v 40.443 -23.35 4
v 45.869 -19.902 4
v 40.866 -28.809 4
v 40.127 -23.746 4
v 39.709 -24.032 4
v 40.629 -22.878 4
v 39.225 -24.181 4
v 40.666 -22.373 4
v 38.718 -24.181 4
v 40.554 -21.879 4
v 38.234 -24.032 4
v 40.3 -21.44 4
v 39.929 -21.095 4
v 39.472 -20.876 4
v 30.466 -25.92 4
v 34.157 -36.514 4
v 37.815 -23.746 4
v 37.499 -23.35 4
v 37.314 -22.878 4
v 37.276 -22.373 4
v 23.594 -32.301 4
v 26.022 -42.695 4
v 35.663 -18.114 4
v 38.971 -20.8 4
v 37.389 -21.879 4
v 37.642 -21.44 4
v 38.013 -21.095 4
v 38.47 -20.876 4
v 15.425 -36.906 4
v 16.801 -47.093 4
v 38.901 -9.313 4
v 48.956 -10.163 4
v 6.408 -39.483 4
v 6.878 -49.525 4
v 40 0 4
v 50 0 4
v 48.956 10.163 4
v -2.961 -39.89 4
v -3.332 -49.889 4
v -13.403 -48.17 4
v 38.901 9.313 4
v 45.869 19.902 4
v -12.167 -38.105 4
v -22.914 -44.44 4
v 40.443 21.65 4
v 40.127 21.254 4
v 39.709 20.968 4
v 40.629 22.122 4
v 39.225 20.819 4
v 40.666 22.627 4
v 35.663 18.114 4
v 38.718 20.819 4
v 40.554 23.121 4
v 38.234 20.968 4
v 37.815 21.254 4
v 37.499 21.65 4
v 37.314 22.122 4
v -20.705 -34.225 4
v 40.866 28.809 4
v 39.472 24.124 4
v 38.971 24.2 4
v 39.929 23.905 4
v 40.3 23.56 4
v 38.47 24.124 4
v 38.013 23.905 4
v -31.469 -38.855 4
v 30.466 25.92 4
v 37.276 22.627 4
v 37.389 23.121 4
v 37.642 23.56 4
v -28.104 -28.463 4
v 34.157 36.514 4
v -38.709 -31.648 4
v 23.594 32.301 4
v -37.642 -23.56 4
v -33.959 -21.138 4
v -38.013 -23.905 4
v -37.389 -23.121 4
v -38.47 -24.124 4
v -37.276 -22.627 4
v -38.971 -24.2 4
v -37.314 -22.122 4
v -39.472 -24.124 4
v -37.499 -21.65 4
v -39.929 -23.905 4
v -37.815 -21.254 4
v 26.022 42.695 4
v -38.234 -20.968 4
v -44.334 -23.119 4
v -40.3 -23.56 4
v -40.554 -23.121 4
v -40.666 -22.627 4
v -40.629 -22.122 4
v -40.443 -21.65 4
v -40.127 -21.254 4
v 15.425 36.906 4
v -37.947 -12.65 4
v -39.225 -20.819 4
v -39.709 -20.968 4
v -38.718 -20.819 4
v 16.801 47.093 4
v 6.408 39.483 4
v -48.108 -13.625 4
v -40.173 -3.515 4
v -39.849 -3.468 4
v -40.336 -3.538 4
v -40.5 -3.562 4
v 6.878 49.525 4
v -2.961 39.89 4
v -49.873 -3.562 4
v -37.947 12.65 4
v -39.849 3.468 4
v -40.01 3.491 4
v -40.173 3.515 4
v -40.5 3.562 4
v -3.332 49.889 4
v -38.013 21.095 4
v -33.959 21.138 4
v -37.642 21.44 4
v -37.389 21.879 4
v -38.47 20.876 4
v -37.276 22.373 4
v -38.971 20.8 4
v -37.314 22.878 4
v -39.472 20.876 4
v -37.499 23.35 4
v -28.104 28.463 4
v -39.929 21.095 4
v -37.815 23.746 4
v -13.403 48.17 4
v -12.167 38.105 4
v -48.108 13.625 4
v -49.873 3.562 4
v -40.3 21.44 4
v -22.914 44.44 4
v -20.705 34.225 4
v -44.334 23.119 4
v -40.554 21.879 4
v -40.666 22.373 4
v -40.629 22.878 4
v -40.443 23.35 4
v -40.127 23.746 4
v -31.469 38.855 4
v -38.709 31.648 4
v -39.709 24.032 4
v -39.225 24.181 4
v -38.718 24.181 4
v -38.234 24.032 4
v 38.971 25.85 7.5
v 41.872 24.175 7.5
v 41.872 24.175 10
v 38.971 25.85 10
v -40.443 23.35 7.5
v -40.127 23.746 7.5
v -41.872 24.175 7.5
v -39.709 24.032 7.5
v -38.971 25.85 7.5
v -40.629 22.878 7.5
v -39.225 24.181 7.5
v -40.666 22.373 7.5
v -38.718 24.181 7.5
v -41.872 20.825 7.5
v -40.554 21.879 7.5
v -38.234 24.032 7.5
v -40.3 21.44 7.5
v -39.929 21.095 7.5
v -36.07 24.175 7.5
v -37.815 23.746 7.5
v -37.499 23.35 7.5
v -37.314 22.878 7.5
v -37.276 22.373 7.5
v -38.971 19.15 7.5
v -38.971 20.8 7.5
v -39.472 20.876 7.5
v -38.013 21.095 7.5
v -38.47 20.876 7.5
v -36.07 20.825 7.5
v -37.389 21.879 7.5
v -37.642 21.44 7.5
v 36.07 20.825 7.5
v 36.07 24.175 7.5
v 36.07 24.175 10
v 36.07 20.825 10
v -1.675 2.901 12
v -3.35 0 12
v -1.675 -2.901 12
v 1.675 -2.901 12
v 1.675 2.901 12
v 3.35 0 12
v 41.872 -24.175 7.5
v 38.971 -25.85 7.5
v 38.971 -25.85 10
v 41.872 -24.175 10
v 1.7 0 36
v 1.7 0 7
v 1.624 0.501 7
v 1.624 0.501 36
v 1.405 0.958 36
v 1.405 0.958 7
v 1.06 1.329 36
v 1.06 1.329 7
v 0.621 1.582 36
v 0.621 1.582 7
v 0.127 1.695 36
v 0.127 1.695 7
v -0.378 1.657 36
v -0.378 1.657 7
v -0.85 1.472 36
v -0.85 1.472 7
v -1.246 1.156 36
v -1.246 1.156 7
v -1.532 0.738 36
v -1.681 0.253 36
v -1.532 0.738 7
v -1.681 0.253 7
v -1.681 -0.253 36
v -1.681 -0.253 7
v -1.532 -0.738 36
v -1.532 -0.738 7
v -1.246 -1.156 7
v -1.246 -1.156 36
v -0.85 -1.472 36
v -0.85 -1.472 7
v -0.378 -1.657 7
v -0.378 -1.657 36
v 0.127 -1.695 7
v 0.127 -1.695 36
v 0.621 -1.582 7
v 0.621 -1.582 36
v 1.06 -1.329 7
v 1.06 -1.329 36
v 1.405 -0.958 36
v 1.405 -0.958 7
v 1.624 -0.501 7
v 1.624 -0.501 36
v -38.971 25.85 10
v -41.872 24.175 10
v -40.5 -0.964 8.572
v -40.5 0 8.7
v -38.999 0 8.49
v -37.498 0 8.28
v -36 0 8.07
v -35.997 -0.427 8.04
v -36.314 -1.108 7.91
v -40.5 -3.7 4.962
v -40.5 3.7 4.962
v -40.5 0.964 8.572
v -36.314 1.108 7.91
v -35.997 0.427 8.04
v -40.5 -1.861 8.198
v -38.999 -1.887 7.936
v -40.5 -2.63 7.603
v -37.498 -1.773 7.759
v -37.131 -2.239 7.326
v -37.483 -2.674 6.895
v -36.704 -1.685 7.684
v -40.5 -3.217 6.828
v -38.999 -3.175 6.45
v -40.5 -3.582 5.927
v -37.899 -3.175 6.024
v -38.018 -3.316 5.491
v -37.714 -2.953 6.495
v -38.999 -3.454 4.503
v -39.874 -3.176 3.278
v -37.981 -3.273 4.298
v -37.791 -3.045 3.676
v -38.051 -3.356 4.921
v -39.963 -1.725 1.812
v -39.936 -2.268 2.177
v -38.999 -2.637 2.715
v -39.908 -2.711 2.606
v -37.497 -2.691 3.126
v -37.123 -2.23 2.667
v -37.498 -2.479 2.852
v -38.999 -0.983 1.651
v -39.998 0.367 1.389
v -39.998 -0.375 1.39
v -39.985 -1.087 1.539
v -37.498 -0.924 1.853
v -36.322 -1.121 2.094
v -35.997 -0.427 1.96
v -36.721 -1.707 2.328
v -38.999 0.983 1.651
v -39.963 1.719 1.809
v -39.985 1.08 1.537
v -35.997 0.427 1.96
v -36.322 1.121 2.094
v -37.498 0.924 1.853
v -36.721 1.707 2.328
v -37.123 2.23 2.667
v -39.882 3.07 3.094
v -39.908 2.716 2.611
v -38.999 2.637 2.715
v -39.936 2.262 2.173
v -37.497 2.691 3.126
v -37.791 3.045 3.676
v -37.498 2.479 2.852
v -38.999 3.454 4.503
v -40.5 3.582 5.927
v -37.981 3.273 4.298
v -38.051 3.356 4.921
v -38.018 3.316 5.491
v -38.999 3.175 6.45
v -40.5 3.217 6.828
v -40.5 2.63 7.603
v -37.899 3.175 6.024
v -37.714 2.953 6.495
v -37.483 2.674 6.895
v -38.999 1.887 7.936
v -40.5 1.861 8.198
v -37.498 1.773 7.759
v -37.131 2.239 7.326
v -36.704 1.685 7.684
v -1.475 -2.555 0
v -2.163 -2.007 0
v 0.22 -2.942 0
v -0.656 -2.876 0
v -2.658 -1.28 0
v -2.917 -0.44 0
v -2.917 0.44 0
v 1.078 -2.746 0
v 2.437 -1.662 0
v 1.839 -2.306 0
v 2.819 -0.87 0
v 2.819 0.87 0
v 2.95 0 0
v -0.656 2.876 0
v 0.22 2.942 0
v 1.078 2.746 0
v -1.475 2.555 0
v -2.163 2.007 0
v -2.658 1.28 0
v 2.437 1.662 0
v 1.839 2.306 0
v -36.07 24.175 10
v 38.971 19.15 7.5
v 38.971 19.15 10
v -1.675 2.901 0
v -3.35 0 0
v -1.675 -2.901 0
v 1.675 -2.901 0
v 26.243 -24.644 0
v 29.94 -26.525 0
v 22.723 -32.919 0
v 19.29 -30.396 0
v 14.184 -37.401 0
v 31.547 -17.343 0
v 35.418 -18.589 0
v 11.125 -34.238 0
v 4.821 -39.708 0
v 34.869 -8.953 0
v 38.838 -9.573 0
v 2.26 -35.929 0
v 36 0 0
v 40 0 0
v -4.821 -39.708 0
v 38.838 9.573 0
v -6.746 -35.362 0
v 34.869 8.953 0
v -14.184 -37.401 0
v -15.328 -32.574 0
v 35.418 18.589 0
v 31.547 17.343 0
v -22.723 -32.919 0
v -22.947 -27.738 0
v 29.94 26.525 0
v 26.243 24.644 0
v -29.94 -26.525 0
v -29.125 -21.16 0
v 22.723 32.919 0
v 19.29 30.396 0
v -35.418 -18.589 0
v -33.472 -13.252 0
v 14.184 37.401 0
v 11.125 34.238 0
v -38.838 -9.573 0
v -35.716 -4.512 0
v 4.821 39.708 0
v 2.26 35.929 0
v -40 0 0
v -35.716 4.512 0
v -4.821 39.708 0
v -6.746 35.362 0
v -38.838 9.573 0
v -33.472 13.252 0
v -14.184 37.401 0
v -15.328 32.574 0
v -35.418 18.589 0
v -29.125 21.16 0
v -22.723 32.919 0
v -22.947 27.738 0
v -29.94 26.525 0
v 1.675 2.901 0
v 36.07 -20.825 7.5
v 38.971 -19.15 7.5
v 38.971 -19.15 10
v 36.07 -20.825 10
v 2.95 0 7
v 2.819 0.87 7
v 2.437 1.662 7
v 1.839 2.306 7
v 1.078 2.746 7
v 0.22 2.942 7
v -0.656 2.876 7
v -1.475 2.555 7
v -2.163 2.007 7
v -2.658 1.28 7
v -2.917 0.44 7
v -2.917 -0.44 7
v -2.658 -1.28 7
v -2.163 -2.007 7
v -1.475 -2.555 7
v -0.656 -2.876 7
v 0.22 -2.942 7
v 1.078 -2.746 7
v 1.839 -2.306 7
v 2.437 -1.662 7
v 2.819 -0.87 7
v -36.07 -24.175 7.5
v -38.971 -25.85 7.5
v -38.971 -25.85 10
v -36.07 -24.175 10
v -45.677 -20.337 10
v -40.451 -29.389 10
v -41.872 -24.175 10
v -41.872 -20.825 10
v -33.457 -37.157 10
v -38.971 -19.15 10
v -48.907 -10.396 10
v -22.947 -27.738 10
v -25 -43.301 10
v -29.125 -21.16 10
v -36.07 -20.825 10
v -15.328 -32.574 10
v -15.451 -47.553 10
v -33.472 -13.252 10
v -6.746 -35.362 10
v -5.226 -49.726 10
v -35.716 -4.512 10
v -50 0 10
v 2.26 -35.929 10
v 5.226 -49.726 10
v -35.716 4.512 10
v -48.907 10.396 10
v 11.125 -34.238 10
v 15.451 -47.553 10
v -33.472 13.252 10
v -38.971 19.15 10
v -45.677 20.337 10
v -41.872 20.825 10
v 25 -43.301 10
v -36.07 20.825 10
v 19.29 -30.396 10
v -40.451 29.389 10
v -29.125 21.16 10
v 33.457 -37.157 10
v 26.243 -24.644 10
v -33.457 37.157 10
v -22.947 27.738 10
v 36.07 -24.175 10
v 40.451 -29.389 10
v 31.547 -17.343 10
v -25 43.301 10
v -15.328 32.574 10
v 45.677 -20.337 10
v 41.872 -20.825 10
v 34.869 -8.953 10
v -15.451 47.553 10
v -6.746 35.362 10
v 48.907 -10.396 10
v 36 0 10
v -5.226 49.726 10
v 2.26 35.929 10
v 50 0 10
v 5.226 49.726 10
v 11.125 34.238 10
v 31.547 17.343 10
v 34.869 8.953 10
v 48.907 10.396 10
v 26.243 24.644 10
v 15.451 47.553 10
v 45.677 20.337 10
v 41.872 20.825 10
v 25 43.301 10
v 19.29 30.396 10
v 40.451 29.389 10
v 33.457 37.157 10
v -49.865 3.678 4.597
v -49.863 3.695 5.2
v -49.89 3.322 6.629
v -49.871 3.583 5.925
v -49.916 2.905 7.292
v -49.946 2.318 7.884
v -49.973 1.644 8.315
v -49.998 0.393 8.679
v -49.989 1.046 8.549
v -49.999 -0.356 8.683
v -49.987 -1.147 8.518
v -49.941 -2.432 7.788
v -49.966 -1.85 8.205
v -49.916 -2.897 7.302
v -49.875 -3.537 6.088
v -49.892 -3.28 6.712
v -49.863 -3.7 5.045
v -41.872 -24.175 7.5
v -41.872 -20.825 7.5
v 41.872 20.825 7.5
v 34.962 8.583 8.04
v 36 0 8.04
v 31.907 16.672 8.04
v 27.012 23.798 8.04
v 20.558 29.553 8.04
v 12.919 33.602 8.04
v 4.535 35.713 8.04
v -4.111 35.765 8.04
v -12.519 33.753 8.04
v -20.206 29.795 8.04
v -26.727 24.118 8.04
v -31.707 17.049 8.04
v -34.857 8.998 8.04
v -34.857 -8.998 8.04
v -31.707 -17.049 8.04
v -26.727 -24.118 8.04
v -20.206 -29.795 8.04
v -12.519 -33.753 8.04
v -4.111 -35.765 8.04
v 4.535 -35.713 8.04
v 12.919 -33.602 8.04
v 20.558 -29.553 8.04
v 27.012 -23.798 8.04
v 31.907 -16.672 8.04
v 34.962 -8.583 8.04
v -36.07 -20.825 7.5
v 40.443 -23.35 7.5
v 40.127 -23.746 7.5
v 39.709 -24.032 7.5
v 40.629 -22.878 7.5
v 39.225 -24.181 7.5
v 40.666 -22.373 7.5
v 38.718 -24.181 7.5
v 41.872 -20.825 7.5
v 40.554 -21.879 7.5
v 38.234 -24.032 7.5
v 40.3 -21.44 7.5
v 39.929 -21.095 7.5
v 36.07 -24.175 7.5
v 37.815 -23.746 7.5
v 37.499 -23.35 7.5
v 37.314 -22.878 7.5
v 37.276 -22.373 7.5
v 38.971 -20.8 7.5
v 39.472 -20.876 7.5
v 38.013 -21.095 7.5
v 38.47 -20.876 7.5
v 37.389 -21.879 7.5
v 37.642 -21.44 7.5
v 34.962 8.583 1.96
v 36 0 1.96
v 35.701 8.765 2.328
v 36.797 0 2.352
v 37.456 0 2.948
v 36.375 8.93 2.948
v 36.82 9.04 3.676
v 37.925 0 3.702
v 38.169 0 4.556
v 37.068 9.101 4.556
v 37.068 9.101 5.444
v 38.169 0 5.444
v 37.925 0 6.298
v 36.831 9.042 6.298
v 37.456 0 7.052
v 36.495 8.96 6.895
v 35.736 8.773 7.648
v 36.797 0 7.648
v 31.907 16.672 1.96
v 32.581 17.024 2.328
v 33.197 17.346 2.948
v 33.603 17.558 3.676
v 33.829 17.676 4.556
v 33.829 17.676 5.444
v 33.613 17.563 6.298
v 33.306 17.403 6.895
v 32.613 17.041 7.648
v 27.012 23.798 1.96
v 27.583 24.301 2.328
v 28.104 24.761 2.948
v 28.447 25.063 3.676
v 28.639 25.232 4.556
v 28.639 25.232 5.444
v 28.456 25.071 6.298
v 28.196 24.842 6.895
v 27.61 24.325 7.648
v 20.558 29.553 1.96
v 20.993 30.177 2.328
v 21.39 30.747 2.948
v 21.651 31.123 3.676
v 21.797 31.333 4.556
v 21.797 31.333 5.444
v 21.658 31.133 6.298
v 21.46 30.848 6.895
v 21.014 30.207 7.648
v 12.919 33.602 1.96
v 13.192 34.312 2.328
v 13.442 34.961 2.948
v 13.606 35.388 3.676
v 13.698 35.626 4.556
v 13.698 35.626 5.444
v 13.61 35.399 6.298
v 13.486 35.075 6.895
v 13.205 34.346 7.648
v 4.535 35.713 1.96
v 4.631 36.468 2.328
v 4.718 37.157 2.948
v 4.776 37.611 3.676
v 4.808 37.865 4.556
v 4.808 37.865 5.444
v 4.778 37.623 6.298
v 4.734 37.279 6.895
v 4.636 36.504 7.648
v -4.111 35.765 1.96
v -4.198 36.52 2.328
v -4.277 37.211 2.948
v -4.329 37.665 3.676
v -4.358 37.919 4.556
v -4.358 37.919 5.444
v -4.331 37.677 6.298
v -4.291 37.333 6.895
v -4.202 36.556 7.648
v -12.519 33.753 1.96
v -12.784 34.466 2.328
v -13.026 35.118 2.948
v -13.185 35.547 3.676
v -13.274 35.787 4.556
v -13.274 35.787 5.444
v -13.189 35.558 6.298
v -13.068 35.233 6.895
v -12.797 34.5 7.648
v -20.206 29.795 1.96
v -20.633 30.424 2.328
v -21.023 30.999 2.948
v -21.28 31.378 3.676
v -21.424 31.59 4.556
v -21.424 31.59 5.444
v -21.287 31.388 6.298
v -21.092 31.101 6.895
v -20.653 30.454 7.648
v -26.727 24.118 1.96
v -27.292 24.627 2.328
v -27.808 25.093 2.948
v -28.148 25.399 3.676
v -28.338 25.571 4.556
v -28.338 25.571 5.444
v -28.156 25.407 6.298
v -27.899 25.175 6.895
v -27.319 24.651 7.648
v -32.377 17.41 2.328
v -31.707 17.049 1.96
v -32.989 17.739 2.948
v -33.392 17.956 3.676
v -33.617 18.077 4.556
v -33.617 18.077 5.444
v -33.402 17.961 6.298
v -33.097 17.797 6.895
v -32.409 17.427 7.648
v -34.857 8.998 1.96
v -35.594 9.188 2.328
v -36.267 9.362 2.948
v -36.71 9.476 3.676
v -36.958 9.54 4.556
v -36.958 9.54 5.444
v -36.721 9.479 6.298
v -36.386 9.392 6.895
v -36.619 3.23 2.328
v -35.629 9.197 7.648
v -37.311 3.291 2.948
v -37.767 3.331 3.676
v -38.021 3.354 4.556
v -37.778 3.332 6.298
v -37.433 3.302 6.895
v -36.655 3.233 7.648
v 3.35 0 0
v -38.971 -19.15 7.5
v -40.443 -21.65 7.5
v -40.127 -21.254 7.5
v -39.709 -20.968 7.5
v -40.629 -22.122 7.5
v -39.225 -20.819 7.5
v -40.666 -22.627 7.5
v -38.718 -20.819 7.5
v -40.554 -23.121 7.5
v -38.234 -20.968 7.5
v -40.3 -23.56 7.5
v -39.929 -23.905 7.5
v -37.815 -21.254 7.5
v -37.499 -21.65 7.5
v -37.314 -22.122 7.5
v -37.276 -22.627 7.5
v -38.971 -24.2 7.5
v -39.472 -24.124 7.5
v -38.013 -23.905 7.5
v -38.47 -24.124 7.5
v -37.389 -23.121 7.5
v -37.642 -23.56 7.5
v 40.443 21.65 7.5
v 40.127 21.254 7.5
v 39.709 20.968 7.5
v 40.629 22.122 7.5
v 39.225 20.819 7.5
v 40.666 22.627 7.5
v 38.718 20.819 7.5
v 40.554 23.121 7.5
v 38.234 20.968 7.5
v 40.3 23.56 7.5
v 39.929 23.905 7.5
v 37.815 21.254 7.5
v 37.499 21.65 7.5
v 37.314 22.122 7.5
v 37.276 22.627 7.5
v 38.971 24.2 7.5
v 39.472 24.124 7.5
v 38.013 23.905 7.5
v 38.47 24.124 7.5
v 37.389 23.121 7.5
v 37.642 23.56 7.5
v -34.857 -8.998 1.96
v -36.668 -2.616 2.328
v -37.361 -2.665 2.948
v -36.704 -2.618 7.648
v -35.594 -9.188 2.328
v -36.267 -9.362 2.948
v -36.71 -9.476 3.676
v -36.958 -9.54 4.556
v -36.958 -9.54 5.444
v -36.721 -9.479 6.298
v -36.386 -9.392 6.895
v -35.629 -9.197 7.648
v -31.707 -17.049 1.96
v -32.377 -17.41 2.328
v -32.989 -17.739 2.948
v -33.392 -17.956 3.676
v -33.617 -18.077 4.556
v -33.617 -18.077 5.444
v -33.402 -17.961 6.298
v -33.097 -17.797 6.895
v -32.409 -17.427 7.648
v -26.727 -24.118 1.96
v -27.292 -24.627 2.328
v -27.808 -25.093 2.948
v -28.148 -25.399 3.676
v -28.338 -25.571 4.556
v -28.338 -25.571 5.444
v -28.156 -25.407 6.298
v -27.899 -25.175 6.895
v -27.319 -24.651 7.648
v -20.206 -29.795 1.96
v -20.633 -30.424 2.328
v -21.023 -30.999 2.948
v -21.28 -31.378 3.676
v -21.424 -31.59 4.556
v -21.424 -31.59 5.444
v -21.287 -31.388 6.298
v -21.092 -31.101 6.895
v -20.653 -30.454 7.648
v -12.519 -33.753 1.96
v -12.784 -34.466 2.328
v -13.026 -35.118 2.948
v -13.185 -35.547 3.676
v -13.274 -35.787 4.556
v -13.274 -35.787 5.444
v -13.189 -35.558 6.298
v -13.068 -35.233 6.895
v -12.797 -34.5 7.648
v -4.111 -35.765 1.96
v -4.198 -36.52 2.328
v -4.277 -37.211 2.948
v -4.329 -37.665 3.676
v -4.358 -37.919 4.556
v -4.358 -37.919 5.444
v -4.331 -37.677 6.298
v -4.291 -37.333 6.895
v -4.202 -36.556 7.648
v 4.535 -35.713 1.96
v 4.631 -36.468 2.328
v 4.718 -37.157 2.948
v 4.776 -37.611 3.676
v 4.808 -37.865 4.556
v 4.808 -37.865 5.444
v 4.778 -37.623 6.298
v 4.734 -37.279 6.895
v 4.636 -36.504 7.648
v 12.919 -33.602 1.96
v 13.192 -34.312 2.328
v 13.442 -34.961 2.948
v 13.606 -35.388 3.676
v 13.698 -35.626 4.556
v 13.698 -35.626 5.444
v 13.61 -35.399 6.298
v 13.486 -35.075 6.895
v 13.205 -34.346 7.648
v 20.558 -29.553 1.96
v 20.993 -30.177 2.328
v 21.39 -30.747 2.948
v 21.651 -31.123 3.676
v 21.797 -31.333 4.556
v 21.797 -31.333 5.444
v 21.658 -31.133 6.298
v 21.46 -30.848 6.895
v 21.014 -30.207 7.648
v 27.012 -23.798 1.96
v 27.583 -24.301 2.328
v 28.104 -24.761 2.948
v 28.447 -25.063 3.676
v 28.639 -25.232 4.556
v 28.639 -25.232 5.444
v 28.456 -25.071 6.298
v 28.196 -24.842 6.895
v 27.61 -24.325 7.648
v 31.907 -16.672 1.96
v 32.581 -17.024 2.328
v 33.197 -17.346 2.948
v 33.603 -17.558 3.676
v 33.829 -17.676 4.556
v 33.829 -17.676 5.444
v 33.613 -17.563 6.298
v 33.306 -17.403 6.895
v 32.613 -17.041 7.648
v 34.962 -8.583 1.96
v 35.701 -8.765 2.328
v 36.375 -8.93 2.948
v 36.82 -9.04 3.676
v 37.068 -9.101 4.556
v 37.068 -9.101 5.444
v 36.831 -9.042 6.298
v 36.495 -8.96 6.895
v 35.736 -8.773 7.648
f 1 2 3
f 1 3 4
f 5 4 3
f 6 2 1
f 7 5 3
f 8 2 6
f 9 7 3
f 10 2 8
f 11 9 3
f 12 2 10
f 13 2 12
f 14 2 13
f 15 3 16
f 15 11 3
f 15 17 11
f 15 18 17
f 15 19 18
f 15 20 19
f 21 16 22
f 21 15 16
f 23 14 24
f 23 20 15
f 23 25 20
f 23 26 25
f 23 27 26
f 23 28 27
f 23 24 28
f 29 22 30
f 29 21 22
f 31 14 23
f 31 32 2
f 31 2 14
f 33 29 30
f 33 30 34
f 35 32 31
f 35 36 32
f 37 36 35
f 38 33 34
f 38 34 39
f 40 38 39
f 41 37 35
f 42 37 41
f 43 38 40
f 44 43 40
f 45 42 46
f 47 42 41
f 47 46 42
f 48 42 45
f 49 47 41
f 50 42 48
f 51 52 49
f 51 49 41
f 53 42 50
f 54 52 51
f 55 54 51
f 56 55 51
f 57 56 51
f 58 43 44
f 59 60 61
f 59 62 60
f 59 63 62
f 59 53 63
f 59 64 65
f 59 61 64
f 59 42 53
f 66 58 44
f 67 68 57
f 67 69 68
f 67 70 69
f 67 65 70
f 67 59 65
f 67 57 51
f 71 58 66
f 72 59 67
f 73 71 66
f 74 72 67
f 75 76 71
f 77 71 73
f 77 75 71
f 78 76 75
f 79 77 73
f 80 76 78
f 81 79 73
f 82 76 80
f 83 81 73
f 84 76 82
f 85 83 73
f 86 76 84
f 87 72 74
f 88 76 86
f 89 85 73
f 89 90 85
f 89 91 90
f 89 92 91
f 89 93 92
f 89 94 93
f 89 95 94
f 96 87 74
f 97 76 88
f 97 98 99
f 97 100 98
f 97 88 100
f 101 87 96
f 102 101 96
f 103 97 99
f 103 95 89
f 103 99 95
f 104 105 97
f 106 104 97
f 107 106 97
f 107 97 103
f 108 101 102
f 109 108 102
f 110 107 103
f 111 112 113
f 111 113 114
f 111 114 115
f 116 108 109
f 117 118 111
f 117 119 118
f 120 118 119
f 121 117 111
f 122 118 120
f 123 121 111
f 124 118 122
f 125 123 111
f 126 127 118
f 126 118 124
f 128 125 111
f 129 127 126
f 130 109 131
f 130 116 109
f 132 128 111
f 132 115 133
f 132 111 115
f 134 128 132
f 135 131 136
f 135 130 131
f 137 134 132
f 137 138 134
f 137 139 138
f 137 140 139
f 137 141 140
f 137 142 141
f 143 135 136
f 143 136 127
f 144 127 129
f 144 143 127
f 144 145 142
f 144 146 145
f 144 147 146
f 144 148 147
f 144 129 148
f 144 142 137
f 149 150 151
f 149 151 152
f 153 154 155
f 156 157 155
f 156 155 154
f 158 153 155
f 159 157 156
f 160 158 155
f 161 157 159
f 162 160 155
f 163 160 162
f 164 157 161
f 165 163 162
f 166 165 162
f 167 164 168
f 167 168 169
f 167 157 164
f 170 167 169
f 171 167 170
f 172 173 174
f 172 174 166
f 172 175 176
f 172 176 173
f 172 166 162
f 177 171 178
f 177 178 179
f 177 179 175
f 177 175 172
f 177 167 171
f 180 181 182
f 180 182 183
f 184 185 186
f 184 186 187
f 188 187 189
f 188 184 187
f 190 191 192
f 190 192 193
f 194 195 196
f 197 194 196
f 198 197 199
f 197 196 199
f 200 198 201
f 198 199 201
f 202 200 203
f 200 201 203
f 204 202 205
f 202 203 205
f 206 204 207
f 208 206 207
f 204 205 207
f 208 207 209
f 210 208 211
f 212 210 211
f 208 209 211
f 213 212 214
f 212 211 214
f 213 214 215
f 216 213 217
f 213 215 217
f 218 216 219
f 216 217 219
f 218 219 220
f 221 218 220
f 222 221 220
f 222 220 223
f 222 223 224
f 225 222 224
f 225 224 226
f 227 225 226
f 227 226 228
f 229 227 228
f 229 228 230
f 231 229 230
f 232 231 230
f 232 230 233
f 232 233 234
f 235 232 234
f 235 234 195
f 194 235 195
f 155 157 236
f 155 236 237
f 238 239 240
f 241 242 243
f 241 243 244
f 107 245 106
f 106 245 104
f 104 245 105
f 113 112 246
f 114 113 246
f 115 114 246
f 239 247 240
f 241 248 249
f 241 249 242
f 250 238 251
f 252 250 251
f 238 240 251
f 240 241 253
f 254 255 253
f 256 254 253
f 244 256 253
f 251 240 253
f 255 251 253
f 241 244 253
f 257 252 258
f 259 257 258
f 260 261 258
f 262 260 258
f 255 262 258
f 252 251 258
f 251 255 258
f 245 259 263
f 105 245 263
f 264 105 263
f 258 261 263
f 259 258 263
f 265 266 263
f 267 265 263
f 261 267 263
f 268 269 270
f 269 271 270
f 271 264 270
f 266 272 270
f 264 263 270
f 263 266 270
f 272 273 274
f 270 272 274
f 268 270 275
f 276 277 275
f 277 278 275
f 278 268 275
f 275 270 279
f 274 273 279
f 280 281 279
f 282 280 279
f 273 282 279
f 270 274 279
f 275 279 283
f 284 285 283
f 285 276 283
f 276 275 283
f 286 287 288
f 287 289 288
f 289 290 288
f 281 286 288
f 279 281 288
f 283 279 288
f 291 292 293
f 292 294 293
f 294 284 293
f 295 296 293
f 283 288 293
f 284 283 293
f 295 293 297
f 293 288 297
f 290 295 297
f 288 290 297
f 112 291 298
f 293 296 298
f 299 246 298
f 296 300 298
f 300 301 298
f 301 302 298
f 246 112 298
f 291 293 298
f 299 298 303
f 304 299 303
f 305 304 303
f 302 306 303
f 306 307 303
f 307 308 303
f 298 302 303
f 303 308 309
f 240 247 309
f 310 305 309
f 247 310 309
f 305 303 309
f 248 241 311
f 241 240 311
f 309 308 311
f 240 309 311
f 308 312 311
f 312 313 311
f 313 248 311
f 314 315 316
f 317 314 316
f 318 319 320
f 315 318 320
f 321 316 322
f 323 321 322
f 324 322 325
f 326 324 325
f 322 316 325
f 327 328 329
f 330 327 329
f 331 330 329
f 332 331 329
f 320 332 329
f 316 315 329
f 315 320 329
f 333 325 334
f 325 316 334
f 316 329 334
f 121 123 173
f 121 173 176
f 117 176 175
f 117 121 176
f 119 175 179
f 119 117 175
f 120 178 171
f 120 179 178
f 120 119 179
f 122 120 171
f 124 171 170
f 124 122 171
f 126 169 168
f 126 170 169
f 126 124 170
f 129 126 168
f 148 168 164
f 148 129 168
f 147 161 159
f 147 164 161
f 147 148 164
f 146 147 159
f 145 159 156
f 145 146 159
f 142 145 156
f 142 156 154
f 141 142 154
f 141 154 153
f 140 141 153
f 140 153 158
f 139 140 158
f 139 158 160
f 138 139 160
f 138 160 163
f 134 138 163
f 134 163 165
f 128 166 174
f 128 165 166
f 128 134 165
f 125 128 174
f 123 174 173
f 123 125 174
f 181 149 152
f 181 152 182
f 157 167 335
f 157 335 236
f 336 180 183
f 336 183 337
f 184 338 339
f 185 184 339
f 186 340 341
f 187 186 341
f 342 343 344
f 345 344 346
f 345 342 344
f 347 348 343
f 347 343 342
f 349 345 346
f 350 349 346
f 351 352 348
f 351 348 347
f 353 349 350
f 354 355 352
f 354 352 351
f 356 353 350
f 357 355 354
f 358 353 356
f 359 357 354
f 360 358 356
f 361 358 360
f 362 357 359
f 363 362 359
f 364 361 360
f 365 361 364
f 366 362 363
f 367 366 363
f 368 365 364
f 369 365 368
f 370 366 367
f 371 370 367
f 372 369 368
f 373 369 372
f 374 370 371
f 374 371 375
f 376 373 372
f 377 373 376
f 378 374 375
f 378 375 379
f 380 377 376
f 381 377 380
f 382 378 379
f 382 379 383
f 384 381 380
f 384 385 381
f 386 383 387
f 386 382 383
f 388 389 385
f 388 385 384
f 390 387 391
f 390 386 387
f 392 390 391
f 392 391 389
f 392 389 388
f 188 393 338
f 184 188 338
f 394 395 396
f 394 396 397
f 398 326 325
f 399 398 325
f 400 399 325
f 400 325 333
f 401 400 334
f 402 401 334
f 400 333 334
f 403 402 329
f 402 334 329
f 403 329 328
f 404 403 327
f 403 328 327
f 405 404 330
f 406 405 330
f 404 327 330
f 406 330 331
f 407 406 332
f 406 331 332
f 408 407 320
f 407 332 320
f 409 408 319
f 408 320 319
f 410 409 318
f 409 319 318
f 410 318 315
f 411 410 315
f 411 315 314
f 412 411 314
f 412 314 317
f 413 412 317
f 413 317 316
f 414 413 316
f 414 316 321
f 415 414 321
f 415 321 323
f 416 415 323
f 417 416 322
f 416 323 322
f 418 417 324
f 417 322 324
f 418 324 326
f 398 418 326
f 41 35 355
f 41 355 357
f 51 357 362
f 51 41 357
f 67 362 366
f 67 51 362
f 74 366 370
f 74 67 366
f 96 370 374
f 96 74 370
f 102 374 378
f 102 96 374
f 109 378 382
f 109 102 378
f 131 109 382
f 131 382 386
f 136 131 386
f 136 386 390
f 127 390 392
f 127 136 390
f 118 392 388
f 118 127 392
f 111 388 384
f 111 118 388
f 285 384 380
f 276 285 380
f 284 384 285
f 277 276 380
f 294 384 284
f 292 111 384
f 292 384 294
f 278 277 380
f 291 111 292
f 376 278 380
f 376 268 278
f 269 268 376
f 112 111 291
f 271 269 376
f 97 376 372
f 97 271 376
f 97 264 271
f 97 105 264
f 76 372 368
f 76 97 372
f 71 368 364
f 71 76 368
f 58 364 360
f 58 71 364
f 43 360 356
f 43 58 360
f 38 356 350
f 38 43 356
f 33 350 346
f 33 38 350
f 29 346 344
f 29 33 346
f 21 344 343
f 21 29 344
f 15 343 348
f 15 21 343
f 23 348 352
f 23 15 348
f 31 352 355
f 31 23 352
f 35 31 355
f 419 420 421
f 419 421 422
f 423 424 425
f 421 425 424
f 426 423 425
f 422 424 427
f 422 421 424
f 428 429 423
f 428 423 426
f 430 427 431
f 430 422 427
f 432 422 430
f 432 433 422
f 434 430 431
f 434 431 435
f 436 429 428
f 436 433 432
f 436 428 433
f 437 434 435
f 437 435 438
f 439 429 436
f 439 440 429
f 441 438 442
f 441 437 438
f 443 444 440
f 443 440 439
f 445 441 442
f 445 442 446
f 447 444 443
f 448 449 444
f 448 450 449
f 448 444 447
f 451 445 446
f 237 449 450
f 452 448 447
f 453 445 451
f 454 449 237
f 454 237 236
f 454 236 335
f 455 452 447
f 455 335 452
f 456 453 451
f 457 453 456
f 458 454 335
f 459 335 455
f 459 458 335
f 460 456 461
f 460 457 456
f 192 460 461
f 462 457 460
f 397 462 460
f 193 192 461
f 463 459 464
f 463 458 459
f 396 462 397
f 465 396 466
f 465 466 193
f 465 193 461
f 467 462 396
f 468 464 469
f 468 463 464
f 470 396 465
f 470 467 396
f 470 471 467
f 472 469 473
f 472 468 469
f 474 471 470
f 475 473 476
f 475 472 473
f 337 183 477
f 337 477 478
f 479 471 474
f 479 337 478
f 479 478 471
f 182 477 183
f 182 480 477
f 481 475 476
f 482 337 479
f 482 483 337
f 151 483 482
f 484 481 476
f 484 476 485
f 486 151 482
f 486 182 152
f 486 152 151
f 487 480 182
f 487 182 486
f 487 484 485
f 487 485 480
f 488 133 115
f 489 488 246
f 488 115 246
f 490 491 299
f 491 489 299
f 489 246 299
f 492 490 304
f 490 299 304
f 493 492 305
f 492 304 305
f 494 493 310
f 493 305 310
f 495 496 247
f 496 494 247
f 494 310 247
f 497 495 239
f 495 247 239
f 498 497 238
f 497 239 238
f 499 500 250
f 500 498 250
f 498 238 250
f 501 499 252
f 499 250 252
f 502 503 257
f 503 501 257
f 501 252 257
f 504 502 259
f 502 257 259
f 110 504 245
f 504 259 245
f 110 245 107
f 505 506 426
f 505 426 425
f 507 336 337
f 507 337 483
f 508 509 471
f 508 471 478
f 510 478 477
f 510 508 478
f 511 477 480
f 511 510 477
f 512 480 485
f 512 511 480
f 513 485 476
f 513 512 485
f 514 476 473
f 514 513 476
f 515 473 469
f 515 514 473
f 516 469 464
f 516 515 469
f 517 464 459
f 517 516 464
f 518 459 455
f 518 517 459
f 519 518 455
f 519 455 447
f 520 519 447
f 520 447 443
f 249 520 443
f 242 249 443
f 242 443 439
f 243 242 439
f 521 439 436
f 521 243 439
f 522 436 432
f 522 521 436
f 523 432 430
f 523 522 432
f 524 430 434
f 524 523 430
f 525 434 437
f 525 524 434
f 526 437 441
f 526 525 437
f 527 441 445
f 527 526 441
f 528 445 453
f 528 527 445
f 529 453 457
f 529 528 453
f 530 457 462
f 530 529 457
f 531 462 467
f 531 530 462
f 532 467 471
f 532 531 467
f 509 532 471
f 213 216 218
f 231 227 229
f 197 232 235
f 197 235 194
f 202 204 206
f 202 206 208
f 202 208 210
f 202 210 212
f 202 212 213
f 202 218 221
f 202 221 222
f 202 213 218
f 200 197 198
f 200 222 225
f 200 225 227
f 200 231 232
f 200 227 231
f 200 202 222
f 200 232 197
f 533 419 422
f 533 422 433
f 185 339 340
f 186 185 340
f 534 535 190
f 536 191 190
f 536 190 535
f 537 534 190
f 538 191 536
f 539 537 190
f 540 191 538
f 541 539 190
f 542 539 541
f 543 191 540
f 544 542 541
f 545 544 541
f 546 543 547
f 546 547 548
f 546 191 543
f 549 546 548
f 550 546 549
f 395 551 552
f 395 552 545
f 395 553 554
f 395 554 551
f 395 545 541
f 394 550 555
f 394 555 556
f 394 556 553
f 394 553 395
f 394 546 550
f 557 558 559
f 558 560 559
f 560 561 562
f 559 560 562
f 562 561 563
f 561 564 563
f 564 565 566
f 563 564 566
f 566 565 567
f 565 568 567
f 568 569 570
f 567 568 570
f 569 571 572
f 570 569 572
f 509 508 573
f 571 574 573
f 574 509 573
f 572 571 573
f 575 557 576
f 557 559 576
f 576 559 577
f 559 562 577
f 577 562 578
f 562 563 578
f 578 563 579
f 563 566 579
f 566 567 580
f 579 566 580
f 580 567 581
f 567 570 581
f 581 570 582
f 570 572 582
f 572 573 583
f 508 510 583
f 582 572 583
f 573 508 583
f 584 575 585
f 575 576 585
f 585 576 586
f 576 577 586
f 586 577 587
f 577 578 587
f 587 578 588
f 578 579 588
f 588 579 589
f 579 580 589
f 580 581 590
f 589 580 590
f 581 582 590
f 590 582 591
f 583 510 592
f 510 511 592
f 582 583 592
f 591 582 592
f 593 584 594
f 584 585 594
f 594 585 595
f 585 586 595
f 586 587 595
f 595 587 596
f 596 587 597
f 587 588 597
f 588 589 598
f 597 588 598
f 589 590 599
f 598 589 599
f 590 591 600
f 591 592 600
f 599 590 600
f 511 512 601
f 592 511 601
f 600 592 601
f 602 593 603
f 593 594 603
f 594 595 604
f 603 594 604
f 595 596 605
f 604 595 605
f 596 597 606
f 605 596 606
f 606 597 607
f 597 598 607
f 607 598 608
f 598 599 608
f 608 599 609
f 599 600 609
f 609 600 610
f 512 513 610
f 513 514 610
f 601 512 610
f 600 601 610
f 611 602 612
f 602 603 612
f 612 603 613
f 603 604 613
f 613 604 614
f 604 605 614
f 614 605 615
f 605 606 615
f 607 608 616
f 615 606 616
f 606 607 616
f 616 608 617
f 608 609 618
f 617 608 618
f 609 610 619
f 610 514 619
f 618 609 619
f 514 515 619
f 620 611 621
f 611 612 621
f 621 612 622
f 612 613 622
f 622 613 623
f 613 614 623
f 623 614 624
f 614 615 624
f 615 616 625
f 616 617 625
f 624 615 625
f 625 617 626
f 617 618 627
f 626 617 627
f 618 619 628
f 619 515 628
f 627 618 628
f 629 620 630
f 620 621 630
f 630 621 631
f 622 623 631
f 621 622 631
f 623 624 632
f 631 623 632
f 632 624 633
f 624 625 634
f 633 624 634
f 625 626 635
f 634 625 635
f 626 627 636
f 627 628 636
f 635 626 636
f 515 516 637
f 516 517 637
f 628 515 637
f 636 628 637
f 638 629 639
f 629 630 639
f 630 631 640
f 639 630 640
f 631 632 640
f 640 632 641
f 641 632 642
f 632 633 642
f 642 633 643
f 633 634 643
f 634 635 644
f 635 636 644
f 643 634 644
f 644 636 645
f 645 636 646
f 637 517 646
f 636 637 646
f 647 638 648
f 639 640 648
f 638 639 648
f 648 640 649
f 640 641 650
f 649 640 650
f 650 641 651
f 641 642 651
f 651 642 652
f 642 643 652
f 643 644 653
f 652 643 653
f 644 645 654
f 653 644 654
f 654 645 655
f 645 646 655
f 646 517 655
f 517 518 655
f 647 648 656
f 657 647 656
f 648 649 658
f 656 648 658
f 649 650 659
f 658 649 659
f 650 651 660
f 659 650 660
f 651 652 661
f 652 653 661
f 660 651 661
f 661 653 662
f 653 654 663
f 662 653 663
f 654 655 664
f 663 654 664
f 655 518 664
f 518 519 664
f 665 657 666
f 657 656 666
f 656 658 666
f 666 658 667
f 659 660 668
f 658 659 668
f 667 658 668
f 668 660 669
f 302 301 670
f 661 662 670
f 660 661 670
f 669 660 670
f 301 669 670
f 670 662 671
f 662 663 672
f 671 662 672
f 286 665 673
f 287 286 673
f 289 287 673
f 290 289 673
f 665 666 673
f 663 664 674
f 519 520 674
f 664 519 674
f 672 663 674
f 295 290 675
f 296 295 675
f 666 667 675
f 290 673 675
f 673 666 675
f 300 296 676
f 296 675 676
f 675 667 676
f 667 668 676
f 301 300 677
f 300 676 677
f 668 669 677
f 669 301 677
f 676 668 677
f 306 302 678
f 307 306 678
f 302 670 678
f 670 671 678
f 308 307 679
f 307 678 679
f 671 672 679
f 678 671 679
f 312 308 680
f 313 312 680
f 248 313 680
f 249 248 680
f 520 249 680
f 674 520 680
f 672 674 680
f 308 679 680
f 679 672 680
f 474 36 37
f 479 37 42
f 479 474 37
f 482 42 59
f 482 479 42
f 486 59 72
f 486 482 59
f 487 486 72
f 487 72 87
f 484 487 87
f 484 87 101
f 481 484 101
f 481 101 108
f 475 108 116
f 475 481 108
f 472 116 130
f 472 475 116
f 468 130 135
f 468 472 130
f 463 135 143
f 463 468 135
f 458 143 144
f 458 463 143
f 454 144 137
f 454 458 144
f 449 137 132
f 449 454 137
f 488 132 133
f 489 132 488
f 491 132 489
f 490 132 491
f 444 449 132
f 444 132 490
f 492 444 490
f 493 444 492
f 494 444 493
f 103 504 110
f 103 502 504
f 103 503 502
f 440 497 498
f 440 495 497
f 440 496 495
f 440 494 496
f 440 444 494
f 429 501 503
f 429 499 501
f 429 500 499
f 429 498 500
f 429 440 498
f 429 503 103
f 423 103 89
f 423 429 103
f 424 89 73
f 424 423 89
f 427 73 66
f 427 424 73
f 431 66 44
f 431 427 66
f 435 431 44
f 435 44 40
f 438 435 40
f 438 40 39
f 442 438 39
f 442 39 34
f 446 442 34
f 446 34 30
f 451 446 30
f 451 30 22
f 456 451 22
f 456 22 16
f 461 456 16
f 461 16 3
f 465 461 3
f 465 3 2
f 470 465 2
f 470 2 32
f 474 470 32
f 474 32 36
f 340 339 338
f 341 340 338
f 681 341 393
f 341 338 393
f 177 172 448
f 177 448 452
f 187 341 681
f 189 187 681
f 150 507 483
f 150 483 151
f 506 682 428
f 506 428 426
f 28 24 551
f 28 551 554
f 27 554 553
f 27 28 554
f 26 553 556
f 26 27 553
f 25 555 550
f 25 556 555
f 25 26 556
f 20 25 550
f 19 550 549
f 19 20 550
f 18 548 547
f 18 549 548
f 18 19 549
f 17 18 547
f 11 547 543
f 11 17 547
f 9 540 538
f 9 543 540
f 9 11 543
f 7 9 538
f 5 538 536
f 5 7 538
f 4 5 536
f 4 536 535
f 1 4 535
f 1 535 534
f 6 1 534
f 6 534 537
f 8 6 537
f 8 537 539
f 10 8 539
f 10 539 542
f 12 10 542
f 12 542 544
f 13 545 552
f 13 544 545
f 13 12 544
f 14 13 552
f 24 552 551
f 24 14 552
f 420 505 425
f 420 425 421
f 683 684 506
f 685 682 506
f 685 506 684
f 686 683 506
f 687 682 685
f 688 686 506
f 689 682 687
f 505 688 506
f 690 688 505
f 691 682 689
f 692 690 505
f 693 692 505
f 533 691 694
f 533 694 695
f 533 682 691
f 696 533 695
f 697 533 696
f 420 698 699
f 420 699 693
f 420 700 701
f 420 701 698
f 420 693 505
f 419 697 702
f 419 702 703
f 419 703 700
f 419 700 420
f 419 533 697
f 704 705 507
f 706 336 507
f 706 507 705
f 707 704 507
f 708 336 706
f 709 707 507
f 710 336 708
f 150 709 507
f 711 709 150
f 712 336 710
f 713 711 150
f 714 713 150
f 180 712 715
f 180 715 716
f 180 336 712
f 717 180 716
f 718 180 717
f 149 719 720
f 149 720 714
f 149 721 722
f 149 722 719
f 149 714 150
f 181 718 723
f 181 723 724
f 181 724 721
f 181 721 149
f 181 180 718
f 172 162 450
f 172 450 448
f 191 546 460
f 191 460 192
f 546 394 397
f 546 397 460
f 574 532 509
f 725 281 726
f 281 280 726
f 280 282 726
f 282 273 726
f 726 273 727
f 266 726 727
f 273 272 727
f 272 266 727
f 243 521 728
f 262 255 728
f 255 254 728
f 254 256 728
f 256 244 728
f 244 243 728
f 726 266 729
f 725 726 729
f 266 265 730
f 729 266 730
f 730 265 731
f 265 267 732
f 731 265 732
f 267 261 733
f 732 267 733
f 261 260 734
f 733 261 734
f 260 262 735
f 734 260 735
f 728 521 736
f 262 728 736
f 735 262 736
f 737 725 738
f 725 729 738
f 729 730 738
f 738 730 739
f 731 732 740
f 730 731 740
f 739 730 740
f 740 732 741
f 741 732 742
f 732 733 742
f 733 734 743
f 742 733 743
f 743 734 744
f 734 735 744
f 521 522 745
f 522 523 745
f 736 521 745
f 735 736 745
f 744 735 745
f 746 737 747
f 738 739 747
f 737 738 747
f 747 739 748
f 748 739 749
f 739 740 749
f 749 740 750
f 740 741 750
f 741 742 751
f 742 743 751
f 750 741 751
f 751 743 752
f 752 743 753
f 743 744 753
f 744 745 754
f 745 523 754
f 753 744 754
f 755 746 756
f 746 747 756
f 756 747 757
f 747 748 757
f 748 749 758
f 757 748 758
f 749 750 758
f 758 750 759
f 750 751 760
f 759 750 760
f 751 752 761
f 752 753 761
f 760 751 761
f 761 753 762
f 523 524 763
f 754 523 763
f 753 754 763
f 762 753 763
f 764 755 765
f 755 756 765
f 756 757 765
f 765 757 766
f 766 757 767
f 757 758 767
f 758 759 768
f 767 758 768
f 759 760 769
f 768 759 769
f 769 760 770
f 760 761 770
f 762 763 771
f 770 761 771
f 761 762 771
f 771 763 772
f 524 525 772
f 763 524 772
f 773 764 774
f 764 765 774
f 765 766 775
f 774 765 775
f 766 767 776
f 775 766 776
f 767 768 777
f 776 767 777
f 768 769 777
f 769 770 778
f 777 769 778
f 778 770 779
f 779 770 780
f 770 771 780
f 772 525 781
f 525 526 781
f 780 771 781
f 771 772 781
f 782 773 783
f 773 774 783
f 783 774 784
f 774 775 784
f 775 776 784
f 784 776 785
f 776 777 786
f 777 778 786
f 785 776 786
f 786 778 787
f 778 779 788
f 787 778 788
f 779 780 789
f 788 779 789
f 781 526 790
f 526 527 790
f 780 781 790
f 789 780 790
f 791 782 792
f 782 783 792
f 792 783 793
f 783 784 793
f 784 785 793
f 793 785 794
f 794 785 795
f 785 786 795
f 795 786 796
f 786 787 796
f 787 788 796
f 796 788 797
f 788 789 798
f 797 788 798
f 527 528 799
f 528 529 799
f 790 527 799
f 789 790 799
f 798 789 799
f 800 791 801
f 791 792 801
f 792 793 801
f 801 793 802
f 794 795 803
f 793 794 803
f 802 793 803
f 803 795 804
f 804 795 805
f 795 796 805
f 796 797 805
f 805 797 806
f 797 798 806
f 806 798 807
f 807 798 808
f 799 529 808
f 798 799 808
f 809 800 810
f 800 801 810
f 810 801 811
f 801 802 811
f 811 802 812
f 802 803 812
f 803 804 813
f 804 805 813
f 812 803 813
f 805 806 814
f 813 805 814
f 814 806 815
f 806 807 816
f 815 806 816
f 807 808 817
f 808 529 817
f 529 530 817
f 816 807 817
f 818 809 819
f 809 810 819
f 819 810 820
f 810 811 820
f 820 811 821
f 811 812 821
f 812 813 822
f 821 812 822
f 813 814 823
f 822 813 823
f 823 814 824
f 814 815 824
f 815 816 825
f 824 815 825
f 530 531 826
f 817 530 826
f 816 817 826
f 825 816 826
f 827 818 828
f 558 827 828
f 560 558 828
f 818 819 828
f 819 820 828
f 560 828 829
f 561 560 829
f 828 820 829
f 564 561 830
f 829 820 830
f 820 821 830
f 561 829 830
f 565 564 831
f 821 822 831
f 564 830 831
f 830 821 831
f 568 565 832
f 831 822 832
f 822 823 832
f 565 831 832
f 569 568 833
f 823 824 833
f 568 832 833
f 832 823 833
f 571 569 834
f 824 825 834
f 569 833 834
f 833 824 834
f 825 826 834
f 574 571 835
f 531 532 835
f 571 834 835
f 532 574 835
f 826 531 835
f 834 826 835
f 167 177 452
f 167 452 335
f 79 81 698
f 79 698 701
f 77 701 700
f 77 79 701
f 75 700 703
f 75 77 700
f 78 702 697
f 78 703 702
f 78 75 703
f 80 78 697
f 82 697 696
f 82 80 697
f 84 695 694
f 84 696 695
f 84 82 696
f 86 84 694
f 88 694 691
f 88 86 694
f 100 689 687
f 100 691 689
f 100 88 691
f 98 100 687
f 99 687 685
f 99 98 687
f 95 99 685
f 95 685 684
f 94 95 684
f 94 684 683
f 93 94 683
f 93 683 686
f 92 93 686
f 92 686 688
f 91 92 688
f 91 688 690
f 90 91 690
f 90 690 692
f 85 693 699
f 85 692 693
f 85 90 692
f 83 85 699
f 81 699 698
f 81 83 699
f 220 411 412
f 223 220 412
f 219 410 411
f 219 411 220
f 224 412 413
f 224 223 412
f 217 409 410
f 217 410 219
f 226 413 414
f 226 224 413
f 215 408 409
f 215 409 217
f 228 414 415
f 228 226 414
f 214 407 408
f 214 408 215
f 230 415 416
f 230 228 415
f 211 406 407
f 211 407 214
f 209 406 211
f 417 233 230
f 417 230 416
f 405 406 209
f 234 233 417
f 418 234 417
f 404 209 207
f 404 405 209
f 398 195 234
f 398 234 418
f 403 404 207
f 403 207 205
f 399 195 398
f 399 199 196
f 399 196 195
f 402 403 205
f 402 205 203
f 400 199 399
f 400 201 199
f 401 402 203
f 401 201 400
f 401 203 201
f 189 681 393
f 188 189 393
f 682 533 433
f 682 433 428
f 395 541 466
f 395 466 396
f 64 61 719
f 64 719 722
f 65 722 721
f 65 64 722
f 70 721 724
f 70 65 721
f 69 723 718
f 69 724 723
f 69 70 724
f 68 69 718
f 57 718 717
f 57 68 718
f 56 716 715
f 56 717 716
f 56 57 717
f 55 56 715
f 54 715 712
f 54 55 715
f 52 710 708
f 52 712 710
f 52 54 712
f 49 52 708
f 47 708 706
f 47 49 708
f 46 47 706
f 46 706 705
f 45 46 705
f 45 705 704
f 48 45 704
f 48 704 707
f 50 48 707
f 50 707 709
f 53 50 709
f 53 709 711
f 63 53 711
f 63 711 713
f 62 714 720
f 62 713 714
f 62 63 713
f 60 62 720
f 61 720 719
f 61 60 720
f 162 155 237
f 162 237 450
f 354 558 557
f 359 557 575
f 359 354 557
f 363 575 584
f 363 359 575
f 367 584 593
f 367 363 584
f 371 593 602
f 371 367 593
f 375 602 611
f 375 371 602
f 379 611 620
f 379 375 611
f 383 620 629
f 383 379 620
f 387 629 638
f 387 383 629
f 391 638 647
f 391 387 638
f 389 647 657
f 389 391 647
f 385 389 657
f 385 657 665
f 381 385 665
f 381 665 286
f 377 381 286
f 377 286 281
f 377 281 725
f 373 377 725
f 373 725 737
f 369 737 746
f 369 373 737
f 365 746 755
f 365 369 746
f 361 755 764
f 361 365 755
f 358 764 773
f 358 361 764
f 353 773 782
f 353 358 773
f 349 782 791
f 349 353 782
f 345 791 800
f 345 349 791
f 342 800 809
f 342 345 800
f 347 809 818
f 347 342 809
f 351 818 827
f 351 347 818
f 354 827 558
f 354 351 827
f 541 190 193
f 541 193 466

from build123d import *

# Parameters (mm, degrees)
CYLINDER_R               = 2.95
CYLINDER_DEPTH           = 7
CYLINDER001_R            = 1.7
CYLINDER001_DEPTH        = 30
PRISM_DEPTH              = 12
CLONE255_PLACEMENT_ANGLE = -90
CLONE258_PLACEMENT_ANGLE = 90
CLONE259_PLACEMENT_ANGLE = -90
CLONE256_PLACEMENT_ANGLE = 90
CLONE254_PLACEMENT_ANGLE = 90
CLONE257_PLACEMENT_ANGLE = -90
CLONE253_PLACEMENT_ANGLE = -90
CLONE252_PLACEMENT_ANGLE = 90


with BuildPart() as m3bolthead:
    # Cylinder → Cylinder (new body)
    with BuildSketch(Plane.XY):
        Circle(CYLINDER_R)
    extrude(amount=CYLINDER_DEPTH)


with BuildPart() as m3bolt:
    # Cylinder001 → Cylinder001 (new body)
    with BuildSketch(Plane.XY.offset(6)):
        Circle(CYLINDER001_R)
    extrude(amount=CYLINDER001_DEPTH)

    # Fusion: union M3BoltHead
    add(m3bolthead.part)


with BuildPart() as m3nut:
    # Prism → Prism (new body)
    with BuildSketch(Plane.XY):
        Polygon((3.35, 0), (1.675, 2.901185), (-1.675, 2.901185), (-3.35, 0), (-1.675, -2.901185), (1.675, -2.901185), align=None)
    extrude(amount=PRISM_DEPTH)


with BuildPart() as clone_of_m3bolt088:
    # Clone255 base: copy of M3Bolt
    add(m3bolt.part)


with BuildPart() as clone_of_m3bolt088_1:
    # Clone255 placement: moved
    add(clone_of_m3bolt088.part.moved(Location((-38.971143, 22.5, -20.5))).rotate(Axis((-38.971143, 22.5, -20.5), (0, 0, 1)), CLONE255_PLACEMENT_ANGLE))


with BuildPart() as clone_of_m3nut011:
    # Clone258 base: copy of M3Nut
    add(m3nut.part)


with BuildPart() as clone_of_m3nut011_1:
    # Clone258 placement: moved
    add(clone_of_m3nut011.part.moved(Location((38.971143, -22.5, 7.5))).rotate(Axis((38.971143, -22.5, 7.5), (0, 0, 1)), CLONE258_PLACEMENT_ANGLE))


with BuildPart() as clone_of_m3nut012:
    # Clone259 base: copy of M3Nut
    add(m3nut.part)


with BuildPart() as clone_of_m3nut012_1:
    # Clone259 placement: moved
    add(clone_of_m3nut012.part.moved(Location((-38.971143, 22.5, 7.5))).rotate(Axis((-38.971143, 22.5, 7.5), (0, 0, 1)), CLONE259_PLACEMENT_ANGLE))


with BuildPart() as clone_of_m3nut009:
    # Clone256 base: copy of M3Nut
    add(m3nut.part)


with BuildPart() as clone_of_m3nut009_1:
    # Clone256 placement: moved
    add(clone_of_m3nut009.part.moved(Location((38.971143, 22.5, 7.5))).rotate(Axis((38.971143, 22.5, 7.5), (0, 0, 1)), CLONE256_PLACEMENT_ANGLE))


with BuildPart() as clone_of_m3bolt087:
    # Clone254 base: copy of M3Bolt
    add(m3bolt.part)


with BuildPart() as clone_of_m3bolt087_1:
    # Clone254 placement: moved
    add(clone_of_m3bolt087.part.moved(Location((38.971143, -22.5, -20.5))).rotate(Axis((38.971143, -22.5, -20.5), (0, 0, 1)), CLONE254_PLACEMENT_ANGLE))


with BuildPart() as clone_of_m3nut010:
    # Clone257 base: copy of M3Nut
    add(m3nut.part)


with BuildPart() as clone_of_m3nut010_1:
    # Clone257 placement: moved
    add(clone_of_m3nut010.part.moved(Location((-38.971143, -22.5, 7.5))).rotate(Axis((-38.971143, -22.5, 7.5), (0, 0, 1)), CLONE257_PLACEMENT_ANGLE))


with BuildPart() as clone_of_m3bolt086:
    # Clone253 base: copy of M3Bolt
    add(m3bolt.part)


with BuildPart() as clone_of_m3bolt086_1:
    # Clone253 placement: moved
    add(clone_of_m3bolt086.part.moved(Location((-38.971143, -22.5, -20.5))).rotate(Axis((-38.971143, -22.5, -20.5), (0, 0, 1)), CLONE253_PLACEMENT_ANGLE))


with BuildPart() as fusion090:
    # Clone252 base: copy of M3Bolt
    add(m3bolt.part)


with BuildPart() as fusion090_1:
    # Clone252 placement: moved
    add(fusion090.part.moved(Location((38.971143, 22.5, -20.5))).rotate(Axis((38.971143, 22.5, -20.5), (0, 0, 1)), CLONE252_PLACEMENT_ANGLE))

    # Fusion090: union Clone of M3Bolt088, Clone of M3Nut011, Clone of M3Nut012, Clone of M3Nut009, Clone of M3Bolt087, Clone of M3Nut010, Clone of M3Bolt086
    add(clone_of_m3bolt088_1.part)
    add(clone_of_m3nut011_1.part)
    add(clone_of_m3nut012_1.part)
    add(clone_of_m3nut009_1.part)
    add(clone_of_m3bolt087_1.part)
    add(clone_of_m3nut010_1.part)
    add(clone_of_m3bolt086_1.part)


with BuildPart() as revolution010:
    # Sketch048 → Revolution010 (revolve)
    with BuildSketch(Plane(origin=(-51.5, 0, 5), x_dir=(1, 0, 0), z_dir=(0, -1, 0))):
        Polygon((0, 0), (0, 3.7), (11, 3.7), (16, 3), (16, 0), align=None)
    revolve(axis=Axis((-51.5, 0, 5), (1, 0, 0)))


with BuildPart() as art4bearingringmaster:
    # Sketch047 → Revolution009 (revolve)
    with BuildSketch(Plane.XZ):
        with BuildLine():
            Line((36, 1.960263), (36, 0))
            Line((36, 0), (40, 0))
            Line((40, 0), (40, 4))
            Line((40, 4), (50, 4))
            Line((50, 4), (50, 10))
            Line((50, 10), (36, 10))
            Line((36, 10), (36, 8.039737))
            ThreePointArc((36, 1.960263), (38.2, 5), (36, 8.039737))
        make_face()
    revolve(axis=Axis((0, 0, 0), (0, 0, 1)))

    # Cut077: cut Revolution010
    add(revolution010.part, mode=Mode.SUBTRACT)

    # Cut078: cut Fusion090
    add(fusion090_1.part, mode=Mode.SUBTRACT)


solid = Compound([m3bolt.part, m3nut.part, art4bearingringmaster.part])
